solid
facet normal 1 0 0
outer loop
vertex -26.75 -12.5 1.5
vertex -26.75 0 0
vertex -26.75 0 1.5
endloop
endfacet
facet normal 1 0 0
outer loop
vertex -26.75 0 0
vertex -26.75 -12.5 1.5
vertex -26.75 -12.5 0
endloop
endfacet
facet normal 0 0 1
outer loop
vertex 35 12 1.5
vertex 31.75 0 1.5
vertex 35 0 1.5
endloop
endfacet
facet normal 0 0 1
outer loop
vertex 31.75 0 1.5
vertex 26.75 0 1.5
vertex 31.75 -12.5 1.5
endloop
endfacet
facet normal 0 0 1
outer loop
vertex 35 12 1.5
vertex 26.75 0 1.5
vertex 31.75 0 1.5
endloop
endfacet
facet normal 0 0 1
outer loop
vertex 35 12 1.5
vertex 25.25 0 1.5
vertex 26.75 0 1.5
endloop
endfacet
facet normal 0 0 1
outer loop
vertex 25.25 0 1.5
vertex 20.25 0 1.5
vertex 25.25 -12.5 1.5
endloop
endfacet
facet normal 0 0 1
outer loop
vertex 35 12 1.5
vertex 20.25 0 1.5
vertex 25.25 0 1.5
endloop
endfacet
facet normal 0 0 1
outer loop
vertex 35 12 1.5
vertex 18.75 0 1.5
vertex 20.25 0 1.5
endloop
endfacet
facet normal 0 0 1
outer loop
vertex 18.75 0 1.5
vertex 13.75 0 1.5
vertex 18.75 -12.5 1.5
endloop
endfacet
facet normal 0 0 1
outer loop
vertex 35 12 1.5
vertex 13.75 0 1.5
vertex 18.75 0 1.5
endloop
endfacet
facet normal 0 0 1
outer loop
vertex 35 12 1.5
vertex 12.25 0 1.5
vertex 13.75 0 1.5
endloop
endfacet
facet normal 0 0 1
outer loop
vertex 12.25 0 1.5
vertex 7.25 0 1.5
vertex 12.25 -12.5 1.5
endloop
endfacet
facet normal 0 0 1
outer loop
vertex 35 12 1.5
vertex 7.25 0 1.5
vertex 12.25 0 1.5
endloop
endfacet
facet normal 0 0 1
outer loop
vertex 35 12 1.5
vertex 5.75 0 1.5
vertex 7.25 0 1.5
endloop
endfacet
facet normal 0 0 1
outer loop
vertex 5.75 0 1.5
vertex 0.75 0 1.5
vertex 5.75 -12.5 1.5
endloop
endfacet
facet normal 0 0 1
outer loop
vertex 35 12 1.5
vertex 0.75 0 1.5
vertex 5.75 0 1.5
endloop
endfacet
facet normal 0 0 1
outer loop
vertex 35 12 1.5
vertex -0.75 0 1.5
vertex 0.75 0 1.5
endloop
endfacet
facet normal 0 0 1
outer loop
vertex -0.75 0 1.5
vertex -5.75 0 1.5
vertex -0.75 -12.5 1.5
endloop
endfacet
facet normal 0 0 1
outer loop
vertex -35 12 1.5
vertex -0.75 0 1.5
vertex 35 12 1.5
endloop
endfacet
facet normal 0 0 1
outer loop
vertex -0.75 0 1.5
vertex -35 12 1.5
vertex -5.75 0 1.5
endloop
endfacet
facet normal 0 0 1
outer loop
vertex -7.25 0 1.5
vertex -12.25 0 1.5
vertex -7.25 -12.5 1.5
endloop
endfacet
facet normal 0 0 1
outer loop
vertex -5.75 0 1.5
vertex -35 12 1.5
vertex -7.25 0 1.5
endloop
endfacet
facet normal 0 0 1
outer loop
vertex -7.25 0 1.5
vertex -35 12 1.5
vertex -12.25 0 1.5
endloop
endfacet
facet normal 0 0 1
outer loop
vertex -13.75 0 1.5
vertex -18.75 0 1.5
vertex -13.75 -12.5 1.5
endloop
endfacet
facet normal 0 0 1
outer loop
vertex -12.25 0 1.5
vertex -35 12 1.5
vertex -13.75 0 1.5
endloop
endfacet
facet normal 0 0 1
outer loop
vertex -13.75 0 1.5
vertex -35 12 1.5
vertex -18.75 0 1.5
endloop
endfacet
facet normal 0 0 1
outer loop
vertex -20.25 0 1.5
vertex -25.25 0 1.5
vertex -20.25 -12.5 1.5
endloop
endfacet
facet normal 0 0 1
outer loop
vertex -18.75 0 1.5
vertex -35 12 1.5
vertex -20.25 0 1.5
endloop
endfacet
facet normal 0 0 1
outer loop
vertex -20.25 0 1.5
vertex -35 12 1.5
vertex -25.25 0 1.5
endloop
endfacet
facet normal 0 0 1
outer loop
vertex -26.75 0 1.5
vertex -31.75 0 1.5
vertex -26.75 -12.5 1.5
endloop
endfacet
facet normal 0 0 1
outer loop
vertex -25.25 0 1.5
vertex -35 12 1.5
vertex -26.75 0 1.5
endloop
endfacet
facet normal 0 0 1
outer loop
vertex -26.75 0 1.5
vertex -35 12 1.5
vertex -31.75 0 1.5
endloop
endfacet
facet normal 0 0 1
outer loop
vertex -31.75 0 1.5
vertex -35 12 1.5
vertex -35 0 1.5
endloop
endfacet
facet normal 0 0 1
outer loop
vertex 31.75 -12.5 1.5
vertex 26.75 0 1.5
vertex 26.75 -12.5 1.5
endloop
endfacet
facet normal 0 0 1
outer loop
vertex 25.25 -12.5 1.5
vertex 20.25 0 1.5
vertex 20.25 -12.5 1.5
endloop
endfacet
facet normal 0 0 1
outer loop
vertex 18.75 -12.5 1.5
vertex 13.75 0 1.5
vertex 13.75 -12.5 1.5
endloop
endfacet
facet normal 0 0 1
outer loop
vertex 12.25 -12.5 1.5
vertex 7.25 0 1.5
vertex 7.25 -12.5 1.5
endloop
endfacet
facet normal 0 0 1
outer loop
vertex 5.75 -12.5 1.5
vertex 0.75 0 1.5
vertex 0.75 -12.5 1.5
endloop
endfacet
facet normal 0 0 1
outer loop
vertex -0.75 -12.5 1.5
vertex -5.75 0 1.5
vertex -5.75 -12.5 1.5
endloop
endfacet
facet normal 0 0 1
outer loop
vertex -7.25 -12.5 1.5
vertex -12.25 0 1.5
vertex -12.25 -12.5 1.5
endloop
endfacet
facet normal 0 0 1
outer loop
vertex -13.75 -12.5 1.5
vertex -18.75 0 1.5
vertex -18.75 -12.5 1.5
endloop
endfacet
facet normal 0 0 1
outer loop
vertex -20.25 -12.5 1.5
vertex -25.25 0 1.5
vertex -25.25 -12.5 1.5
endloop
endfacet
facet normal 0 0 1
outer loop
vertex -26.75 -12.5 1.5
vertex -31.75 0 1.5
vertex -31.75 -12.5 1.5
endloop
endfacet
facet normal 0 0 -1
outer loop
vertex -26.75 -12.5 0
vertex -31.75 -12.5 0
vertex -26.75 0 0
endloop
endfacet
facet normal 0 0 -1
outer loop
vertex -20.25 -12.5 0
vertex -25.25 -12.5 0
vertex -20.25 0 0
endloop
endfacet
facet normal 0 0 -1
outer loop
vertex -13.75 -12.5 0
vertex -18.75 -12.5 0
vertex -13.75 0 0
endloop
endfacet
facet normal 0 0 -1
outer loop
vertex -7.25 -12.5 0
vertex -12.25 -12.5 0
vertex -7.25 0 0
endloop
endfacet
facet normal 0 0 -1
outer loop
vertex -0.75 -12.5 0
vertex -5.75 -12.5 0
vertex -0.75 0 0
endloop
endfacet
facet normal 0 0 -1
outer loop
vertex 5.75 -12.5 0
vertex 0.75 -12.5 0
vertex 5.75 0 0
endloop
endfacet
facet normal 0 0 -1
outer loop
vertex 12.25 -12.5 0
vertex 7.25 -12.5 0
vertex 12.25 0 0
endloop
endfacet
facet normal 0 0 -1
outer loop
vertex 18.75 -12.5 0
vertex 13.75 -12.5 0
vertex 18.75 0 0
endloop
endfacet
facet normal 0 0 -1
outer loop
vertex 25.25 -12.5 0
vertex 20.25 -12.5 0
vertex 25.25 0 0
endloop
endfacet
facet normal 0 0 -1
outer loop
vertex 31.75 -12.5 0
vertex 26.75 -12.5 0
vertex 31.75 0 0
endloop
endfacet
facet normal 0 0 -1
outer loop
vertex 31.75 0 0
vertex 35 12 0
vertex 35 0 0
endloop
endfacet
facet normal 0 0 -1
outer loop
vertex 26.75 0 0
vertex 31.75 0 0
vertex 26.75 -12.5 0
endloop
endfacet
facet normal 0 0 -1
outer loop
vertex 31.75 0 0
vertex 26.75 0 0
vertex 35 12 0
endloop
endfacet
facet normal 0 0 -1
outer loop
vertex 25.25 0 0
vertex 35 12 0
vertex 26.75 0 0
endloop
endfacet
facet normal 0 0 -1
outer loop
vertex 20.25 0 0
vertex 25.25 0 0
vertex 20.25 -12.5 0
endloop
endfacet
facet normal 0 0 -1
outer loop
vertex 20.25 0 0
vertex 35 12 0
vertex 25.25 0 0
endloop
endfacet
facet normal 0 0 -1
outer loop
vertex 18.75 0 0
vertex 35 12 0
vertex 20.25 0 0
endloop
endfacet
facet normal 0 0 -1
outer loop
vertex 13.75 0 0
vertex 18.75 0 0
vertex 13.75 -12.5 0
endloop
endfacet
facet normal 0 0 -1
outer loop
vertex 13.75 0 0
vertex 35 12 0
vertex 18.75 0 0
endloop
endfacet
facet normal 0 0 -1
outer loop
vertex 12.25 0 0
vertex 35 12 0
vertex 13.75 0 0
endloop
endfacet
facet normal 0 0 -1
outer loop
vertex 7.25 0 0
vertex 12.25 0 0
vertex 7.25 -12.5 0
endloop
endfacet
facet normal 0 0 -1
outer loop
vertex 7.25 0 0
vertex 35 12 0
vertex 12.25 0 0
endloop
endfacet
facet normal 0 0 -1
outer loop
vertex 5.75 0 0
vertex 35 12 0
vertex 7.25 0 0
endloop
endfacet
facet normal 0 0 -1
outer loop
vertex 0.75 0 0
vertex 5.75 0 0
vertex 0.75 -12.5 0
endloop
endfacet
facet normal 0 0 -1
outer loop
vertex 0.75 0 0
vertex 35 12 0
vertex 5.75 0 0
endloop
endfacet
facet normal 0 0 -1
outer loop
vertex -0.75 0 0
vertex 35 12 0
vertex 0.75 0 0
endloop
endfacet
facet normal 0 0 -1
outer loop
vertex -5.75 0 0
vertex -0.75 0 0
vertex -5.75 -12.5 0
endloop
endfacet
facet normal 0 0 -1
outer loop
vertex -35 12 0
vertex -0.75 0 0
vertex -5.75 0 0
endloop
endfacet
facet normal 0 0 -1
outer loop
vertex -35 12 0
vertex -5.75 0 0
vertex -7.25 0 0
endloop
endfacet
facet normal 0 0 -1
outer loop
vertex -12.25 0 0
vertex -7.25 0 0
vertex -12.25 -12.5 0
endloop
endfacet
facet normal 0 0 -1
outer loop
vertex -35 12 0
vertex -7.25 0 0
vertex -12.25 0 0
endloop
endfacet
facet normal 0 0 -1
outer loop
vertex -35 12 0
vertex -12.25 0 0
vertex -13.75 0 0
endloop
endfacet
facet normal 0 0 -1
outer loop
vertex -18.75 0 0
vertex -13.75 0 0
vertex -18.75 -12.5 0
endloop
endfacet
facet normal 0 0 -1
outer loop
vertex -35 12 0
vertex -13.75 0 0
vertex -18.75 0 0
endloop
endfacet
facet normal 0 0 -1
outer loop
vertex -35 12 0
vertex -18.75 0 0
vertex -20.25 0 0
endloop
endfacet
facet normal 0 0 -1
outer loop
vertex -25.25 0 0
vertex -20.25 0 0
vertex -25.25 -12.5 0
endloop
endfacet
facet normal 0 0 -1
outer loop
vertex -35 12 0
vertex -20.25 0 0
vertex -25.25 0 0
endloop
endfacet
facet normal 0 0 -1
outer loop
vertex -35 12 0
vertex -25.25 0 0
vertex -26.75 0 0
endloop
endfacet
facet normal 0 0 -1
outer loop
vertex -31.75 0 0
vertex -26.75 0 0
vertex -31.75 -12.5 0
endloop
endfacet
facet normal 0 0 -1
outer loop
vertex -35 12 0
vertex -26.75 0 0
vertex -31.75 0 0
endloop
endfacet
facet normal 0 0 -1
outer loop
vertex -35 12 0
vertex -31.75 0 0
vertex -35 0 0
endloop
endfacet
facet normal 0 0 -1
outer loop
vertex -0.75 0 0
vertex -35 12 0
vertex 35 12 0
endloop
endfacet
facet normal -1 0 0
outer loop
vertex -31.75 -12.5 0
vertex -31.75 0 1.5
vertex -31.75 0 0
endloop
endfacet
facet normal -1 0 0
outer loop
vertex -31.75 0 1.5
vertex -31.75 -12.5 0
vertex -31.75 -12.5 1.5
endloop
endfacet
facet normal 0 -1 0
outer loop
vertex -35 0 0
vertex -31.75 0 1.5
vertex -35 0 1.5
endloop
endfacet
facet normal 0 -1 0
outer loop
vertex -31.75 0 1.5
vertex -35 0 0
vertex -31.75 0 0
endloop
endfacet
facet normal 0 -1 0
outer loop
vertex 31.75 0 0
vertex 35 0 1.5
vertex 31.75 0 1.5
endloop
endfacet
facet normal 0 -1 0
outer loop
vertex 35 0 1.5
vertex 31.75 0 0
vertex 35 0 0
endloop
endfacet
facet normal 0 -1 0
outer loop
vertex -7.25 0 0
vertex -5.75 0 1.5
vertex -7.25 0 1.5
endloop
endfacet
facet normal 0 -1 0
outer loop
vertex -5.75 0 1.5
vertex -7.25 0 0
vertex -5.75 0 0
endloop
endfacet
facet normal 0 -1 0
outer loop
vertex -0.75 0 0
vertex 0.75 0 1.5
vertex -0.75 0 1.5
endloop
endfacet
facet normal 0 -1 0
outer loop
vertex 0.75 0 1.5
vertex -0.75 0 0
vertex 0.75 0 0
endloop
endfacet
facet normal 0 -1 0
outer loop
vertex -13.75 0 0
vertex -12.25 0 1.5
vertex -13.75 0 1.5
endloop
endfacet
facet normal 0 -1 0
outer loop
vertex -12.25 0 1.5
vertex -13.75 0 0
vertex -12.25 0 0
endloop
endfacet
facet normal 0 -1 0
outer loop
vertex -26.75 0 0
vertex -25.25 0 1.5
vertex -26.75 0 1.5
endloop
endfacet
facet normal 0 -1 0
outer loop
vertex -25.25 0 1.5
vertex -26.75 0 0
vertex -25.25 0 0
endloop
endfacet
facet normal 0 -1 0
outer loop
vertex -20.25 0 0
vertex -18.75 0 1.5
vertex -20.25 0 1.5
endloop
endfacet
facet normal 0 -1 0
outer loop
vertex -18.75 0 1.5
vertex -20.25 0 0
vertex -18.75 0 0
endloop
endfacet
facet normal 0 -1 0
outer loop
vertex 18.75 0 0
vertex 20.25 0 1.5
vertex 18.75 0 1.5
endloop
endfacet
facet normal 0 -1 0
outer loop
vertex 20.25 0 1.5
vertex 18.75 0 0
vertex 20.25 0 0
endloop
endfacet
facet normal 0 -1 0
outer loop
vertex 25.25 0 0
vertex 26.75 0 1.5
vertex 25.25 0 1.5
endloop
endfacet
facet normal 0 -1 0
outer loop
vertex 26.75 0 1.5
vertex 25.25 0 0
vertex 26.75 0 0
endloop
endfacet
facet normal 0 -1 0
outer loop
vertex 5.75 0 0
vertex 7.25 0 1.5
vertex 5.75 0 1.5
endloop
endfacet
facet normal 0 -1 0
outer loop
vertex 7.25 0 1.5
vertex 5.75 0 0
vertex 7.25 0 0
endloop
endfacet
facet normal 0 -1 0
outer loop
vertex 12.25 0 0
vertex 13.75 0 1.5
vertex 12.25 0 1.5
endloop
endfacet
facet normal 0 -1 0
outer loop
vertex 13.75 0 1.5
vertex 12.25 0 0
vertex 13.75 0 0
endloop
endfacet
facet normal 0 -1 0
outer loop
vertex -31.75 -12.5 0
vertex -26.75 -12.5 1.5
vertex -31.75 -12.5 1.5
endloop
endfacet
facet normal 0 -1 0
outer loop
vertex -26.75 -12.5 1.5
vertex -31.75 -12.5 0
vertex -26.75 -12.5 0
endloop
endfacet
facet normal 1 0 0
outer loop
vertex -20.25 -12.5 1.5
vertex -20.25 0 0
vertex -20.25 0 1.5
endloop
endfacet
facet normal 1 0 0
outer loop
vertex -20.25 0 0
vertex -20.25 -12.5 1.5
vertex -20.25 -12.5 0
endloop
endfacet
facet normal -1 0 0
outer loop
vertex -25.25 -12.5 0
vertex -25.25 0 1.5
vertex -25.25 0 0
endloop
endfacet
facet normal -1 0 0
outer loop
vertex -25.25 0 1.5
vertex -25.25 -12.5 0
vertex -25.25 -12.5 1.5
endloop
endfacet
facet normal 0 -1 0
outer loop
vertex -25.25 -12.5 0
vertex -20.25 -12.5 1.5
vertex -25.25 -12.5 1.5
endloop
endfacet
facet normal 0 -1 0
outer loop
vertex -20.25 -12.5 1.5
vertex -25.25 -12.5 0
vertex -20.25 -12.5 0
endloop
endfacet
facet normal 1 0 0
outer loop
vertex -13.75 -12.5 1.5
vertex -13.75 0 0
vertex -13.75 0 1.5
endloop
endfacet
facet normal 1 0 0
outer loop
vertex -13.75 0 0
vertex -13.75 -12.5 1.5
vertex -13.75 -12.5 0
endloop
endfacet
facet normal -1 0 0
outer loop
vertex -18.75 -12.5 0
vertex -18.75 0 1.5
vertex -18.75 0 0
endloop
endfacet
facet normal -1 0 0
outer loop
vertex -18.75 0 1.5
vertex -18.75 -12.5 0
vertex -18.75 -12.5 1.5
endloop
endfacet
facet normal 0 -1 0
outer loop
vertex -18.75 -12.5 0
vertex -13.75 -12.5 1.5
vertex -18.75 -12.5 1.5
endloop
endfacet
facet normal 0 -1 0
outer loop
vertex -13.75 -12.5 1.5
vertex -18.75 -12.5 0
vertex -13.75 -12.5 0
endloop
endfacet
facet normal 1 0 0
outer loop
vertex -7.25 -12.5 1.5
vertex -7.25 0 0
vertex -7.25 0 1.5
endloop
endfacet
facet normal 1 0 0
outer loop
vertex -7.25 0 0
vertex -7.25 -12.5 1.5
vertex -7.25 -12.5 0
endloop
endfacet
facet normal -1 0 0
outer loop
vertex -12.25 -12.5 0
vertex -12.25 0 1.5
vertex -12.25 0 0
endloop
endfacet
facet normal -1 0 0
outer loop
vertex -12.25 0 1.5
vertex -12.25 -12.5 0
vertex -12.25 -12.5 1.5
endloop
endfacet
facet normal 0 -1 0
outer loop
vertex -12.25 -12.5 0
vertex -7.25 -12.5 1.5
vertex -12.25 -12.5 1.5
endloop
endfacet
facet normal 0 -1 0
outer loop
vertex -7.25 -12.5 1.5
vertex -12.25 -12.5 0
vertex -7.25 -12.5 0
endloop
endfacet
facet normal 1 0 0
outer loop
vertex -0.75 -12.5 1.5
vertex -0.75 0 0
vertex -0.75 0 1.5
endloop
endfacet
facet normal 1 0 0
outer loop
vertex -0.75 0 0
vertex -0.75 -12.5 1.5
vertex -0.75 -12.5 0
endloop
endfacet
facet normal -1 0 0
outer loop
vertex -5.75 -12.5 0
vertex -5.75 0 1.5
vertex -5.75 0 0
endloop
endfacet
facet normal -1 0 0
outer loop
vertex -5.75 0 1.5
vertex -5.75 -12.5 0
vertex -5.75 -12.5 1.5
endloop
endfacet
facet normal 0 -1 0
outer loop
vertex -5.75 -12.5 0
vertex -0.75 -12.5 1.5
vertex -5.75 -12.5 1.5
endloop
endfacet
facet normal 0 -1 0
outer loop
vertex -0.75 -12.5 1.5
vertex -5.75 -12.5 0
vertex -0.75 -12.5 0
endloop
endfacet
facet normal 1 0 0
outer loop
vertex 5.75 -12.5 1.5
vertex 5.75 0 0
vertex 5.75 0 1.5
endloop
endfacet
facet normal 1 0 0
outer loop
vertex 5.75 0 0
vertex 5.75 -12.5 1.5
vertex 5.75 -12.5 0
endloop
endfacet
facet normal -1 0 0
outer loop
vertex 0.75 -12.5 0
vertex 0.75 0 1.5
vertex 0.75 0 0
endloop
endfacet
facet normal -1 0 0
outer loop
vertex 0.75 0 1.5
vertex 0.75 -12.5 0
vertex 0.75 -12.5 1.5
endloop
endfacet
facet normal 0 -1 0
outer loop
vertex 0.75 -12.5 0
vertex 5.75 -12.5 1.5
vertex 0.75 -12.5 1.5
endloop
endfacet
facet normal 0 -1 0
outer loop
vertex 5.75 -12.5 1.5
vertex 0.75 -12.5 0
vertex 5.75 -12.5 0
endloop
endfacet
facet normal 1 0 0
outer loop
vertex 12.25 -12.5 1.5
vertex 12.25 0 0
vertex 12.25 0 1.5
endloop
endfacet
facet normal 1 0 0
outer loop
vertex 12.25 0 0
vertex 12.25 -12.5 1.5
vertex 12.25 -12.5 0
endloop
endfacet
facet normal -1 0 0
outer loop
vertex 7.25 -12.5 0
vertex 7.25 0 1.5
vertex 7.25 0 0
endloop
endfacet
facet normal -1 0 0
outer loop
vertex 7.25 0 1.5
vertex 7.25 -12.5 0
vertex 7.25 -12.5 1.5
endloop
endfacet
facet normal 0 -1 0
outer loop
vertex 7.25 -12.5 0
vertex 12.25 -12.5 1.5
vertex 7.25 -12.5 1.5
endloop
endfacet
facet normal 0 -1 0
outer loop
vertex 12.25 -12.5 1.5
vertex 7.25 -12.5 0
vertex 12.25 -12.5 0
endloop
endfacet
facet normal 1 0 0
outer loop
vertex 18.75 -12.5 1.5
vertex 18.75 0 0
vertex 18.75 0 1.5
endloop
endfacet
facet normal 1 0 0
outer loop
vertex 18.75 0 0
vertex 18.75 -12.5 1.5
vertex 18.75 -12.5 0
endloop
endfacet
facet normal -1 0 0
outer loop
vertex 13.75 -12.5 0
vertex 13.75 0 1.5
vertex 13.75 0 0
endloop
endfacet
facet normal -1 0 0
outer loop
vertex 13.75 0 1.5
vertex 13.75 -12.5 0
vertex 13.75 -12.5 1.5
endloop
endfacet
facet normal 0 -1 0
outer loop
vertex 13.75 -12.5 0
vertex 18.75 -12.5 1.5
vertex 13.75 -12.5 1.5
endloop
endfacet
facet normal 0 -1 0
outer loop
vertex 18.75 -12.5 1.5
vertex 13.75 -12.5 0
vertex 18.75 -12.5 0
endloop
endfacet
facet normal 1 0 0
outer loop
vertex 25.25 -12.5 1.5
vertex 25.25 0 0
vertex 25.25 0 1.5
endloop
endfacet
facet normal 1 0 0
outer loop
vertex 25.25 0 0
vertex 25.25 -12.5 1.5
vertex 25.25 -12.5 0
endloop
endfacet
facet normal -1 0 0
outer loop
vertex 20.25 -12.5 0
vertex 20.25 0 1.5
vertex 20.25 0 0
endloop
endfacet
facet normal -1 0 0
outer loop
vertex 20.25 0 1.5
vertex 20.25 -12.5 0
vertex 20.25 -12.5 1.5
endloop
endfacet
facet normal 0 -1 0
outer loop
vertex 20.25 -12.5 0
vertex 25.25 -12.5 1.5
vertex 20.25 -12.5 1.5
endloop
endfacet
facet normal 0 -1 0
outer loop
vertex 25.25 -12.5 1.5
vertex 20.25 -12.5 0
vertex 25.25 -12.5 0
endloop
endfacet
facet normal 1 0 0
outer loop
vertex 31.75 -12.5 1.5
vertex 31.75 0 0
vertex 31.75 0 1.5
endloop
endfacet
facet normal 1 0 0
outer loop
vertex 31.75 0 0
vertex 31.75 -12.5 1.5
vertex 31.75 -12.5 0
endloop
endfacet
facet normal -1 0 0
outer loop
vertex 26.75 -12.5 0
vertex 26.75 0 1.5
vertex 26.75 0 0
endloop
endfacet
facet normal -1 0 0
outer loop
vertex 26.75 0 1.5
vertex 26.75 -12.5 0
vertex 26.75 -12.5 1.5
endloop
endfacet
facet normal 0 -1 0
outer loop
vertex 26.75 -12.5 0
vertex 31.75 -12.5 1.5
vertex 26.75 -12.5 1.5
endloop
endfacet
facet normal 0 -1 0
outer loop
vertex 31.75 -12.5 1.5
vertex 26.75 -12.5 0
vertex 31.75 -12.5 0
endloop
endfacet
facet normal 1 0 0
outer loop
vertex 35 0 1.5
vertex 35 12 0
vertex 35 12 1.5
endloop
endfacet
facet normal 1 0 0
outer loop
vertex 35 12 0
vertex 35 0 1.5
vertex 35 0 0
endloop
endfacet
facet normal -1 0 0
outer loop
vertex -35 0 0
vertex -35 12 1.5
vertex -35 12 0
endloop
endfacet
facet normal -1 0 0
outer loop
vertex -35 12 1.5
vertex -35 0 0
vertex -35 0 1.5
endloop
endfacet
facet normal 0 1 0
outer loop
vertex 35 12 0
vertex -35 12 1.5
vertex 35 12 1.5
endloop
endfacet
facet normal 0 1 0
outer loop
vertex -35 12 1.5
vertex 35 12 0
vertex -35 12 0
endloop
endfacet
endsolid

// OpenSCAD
// 10-well agarose gel comb, printed lying flat
// Units: mm

// ---- Spine ----
spine_len   = 70;   // spine length along X
spine_wid   = 12;   // spine width along Y

// ---- Teeth ----
tooth_count = 10;   // number of teeth
tooth_w     = 5.0;  // tooth width along X
tooth_len   = 12;   // tooth length along Y
gap         = 1.5;  // gap between teeth

// ---- Plate ----
plate_t     = 1.5;  // plate thickness along Z

// ---- Misc ----
eps         = 0.5;  // cutter overshoot past faces
$fn         = 64;   // curve resolution

pitch       = tooth_w + gap;                 // tooth pitch
row_offset  = -(tooth_count - 1) * pitch / 2; // centre row on origin

union() {
    // Spine
    translate([-spine_len / 2, 0, 0])
        cube([spine_len, spine_wid, plate_t]);

    // Teeth (extend past -Y face, overlap spine slightly)
    for (i = [0 : tooth_count - 1])
        translate([row_offset + i * pitch - tooth_w / 2,
                   -spine_wid - eps,
                   0])
            cube([tooth_w, tooth_len + eps, plate_t]);
}
